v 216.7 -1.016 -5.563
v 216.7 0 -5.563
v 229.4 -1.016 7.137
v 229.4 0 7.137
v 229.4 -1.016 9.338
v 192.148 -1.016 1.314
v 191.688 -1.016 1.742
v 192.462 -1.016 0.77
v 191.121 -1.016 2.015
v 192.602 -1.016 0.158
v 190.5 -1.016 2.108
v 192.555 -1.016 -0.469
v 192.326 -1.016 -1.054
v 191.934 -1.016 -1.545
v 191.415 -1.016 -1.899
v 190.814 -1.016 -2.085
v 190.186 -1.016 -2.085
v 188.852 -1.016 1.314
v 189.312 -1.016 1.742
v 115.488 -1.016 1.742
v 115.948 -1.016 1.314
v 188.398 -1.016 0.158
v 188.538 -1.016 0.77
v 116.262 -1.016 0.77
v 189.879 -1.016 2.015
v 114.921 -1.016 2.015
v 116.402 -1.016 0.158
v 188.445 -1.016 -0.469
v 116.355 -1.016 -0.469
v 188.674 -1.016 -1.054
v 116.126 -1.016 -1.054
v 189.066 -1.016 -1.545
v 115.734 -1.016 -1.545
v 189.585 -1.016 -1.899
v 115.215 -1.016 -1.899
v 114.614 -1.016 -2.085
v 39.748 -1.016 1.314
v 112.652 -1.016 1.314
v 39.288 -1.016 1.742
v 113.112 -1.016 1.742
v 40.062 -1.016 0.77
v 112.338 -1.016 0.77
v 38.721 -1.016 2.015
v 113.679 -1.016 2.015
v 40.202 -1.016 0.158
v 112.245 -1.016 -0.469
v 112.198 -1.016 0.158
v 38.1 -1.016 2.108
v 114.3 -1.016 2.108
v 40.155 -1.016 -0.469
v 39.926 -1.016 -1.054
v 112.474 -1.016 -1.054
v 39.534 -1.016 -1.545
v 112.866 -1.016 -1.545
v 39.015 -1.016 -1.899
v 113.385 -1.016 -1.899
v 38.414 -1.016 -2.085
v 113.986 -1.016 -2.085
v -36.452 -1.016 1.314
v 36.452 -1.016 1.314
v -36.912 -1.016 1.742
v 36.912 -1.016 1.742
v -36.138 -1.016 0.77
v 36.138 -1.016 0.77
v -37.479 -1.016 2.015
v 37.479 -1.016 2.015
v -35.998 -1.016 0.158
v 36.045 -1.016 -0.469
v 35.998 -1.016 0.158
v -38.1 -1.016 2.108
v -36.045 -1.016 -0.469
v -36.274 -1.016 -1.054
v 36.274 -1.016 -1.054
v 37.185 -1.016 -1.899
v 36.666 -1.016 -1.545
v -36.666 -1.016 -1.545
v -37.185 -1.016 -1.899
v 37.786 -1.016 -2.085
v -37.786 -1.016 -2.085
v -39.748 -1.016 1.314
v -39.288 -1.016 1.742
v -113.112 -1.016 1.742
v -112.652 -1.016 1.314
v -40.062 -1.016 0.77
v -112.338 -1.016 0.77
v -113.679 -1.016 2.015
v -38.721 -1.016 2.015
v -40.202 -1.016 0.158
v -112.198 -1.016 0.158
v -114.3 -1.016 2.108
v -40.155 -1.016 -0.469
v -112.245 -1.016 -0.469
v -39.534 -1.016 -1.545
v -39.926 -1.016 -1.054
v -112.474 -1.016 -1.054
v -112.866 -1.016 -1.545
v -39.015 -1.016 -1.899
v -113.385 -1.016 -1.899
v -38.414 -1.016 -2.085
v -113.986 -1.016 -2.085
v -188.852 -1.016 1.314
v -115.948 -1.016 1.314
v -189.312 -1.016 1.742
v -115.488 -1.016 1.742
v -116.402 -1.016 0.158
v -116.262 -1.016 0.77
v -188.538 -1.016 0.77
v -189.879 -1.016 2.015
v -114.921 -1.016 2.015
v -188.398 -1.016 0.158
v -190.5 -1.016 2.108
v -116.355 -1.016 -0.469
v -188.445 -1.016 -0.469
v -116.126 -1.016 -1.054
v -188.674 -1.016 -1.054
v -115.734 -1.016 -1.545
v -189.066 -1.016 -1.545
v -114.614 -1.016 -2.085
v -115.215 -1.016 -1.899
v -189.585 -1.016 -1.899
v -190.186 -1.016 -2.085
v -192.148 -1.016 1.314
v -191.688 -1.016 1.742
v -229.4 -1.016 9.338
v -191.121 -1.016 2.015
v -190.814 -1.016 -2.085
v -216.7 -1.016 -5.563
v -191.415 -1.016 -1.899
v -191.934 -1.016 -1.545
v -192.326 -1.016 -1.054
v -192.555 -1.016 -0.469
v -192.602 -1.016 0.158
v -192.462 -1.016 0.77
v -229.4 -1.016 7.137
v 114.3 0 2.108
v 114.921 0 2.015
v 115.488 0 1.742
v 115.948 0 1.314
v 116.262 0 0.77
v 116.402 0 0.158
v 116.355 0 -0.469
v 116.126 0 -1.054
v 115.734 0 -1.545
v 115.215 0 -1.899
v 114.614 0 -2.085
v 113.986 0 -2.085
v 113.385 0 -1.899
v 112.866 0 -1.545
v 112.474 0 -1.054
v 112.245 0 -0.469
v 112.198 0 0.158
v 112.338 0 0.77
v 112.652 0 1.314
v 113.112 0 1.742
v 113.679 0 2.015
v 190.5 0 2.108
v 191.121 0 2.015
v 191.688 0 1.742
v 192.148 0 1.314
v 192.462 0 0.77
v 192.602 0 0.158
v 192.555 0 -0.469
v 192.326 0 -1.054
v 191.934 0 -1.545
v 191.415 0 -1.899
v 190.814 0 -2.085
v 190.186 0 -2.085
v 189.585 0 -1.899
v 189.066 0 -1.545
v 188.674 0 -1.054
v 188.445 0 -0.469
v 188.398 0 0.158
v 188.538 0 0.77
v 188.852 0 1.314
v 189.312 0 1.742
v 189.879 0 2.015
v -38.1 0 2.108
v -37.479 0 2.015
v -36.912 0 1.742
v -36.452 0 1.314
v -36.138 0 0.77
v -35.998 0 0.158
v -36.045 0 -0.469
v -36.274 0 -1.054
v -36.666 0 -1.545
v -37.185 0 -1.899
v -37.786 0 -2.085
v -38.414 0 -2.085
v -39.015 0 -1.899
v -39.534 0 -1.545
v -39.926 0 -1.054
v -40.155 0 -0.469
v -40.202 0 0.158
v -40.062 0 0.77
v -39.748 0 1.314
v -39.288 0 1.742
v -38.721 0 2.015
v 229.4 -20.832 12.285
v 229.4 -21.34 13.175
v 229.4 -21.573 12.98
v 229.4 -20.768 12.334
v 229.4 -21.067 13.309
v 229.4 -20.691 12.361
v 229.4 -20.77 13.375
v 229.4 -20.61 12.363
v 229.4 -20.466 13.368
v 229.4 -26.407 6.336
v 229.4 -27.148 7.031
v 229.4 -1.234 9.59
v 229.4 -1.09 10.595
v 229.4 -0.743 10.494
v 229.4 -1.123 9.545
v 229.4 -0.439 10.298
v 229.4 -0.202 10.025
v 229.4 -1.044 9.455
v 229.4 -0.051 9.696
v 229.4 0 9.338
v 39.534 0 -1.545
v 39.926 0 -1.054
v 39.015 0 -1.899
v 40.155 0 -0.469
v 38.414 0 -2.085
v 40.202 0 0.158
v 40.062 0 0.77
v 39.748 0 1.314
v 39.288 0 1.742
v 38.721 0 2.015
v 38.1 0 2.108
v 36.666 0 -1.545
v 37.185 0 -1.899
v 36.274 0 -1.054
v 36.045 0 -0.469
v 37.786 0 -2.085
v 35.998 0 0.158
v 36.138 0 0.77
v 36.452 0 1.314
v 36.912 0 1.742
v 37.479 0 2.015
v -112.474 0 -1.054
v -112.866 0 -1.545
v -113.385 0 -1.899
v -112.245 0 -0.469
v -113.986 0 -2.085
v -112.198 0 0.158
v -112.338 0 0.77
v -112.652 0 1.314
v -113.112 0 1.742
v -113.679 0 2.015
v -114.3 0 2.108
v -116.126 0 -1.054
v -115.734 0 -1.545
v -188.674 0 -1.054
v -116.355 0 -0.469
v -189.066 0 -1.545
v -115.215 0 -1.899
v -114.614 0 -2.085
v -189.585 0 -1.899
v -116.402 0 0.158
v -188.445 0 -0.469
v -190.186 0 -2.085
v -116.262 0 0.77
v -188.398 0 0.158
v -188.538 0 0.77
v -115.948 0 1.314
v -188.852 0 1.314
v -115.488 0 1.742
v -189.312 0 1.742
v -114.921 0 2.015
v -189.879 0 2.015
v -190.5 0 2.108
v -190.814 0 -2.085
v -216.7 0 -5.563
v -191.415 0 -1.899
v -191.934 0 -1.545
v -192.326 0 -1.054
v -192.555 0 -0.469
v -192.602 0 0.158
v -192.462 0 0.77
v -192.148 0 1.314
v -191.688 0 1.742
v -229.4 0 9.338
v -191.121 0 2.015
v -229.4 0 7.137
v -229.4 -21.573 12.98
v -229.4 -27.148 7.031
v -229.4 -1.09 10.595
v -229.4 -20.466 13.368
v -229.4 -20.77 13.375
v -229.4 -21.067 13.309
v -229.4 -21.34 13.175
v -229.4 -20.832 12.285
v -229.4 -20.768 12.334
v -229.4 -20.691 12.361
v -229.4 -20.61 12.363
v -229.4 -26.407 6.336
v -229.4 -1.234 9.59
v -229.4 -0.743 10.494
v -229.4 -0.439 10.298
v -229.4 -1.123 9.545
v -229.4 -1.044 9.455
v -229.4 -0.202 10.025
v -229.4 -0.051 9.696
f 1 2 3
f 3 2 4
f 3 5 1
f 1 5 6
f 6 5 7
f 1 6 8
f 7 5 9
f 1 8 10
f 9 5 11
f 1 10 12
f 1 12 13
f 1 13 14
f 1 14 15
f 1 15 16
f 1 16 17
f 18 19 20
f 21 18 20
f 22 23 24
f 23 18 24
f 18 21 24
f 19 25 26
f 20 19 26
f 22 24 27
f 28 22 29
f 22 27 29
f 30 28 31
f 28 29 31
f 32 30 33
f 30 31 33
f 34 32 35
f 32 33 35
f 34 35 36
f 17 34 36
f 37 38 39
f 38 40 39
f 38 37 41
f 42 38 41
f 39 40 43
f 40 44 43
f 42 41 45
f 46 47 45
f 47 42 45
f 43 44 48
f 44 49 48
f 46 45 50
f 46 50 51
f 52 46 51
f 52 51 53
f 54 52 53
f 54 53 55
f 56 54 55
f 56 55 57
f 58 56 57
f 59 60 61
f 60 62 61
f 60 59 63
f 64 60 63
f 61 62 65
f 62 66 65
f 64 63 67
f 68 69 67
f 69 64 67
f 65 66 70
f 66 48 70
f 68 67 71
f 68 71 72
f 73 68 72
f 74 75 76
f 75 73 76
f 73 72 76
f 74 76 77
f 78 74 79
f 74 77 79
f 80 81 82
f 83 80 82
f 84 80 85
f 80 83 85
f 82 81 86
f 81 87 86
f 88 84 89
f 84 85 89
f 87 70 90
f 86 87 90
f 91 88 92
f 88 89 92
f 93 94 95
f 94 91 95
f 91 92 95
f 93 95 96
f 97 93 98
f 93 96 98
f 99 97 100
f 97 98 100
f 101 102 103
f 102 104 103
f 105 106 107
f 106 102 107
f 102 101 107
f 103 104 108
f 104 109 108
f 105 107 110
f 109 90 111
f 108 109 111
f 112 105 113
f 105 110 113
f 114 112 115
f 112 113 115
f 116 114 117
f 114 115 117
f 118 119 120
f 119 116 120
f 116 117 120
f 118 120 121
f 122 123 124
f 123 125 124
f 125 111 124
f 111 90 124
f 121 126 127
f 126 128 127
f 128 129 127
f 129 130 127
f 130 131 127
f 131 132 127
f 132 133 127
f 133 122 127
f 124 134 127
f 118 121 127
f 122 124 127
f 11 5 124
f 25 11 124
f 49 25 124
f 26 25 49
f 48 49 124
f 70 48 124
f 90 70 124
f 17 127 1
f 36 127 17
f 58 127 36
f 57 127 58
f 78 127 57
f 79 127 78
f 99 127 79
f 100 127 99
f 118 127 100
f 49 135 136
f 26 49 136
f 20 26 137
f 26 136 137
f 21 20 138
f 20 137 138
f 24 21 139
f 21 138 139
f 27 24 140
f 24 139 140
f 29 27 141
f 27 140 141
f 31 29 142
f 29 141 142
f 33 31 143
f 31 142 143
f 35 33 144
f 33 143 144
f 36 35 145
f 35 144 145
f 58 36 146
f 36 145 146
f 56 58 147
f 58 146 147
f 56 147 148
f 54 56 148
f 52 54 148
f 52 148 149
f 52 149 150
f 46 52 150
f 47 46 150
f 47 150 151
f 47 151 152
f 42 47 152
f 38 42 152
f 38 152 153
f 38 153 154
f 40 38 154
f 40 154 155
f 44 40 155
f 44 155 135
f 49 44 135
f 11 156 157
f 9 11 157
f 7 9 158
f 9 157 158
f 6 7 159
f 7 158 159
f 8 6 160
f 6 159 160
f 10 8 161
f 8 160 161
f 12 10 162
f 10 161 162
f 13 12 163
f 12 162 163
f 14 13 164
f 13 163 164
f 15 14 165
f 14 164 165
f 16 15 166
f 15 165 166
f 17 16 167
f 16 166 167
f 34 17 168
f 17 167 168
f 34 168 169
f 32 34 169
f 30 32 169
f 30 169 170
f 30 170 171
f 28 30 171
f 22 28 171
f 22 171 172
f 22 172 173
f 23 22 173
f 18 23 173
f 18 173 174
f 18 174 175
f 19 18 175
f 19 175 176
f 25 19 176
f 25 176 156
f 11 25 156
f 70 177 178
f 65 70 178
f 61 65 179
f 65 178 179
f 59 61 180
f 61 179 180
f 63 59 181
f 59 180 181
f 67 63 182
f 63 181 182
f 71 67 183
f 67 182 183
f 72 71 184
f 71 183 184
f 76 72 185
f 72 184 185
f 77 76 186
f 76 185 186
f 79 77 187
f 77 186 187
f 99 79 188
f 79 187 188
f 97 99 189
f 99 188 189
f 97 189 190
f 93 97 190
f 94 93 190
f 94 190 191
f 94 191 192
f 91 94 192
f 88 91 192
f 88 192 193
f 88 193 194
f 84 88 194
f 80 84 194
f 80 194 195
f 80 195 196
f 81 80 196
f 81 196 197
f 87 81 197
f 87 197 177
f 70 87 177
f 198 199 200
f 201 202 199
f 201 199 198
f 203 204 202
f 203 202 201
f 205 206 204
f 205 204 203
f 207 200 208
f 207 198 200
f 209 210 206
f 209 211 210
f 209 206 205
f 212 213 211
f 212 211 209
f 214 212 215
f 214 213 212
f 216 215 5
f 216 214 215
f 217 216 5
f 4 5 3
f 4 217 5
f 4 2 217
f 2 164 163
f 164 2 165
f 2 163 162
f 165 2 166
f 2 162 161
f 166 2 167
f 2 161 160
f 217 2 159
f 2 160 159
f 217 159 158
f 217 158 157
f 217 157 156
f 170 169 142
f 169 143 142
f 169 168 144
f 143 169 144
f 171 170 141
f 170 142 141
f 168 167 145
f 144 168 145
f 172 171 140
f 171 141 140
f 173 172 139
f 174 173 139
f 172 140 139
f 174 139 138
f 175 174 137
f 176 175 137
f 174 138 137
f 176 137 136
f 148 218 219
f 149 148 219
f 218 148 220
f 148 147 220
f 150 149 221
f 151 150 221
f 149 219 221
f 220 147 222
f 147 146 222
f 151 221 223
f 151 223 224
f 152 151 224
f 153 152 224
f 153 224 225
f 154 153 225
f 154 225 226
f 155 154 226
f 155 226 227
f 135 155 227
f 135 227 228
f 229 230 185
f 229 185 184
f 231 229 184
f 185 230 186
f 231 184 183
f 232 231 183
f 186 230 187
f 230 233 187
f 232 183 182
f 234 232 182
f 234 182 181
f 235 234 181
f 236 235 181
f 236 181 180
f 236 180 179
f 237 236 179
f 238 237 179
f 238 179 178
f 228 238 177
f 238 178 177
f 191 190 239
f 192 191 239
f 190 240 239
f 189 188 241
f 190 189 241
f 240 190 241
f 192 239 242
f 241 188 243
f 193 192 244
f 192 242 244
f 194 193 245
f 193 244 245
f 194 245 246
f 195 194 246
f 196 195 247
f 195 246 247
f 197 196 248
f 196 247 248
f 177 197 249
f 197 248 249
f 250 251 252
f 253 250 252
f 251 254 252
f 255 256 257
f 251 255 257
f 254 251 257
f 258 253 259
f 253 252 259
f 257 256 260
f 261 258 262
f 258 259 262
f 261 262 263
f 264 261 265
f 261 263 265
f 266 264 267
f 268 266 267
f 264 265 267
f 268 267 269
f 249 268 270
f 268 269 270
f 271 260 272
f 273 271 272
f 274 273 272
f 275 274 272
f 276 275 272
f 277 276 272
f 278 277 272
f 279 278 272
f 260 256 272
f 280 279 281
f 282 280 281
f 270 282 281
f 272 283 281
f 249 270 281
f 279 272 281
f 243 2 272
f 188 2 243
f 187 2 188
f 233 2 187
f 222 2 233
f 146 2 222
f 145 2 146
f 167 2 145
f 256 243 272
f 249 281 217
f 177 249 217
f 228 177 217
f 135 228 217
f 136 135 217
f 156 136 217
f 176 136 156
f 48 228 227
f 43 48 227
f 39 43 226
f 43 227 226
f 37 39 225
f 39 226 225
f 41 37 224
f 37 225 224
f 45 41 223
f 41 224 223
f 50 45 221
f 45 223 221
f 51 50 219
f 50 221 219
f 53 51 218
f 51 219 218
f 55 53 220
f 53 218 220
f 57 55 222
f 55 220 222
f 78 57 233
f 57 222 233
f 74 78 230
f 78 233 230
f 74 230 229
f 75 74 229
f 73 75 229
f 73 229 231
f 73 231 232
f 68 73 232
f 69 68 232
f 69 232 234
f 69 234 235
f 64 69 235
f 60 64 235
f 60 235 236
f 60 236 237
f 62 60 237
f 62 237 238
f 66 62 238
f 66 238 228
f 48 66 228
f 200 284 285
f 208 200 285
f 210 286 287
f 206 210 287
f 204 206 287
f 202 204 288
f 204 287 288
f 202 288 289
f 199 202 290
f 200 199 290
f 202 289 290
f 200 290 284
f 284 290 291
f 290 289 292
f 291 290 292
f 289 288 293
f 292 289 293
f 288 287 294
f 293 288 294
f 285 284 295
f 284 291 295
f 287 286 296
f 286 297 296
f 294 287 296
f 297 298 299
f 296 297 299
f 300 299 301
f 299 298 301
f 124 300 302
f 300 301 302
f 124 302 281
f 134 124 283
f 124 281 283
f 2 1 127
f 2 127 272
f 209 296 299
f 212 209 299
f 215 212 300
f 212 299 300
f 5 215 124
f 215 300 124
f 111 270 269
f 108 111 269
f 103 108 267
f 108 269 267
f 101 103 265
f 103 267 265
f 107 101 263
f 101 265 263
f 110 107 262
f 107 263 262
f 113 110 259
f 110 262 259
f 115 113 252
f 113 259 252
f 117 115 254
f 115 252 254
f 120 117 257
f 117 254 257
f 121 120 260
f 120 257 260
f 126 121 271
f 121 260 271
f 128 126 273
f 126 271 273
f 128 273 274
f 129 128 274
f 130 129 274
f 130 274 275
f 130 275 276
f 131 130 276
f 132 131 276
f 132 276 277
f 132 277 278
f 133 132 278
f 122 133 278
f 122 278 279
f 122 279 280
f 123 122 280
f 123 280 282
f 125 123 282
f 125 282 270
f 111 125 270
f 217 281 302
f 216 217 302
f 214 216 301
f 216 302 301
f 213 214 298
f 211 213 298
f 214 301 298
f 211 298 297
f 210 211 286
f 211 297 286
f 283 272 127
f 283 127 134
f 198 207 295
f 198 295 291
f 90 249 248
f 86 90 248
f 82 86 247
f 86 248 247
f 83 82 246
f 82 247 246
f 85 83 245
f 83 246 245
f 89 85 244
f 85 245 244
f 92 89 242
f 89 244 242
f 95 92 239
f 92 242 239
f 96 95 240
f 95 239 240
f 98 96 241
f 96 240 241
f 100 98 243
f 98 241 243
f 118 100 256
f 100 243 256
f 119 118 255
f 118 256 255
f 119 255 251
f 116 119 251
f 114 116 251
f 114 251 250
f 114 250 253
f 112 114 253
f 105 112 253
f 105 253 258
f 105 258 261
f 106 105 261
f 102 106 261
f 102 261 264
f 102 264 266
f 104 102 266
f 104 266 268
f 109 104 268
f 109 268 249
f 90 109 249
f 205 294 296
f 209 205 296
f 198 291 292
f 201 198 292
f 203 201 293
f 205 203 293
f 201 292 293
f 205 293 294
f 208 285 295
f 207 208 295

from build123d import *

# Parameters (mm, degrees)
BASE_FLANGE1_START = -229.4001
BASE_FLANGE1_DEPTH = 458.8002
SKETCH3_R          = 2.1082
CUT_EXTRUDE1_DEPTH = 232.388150944
CUT_EXTRUDE2_DEPTH = 1.016


# Read off the part's stored shape, not the designer's step: Base-Flange1
with BuildPart() as part:
    # Base-Flange1 outline → Base-Flange1 (new body)
    with BuildSketch(Plane(origin=(0, 0, 0), x_dir=(0, 0, -1), z_dir=(1, 0, 0)).offset(BASE_FLANGE1_START)):
        with BuildLine():
            ThreePointArc((-13.368341311, -20.466361656), (-13.309368584, -21.067196635), (-12.979624418, -21.572913195))
            Line((-12.979624418, -21.572913195), (-7.031153987, -27.148026486))
            Line((-7.031153987, -27.148026486), (-6.336374453, -26.406718588))
            Line((-6.336374453, -26.406718588), (-12.284844884, -20.831605297))
            ThreePointArc((-12.284844884, -20.831605297), (-12.350793717, -20.730461985), (-12.362588262, -20.610294989))
            Line((-12.362588262, -20.610294989), (-9.589648793, -1.234016667))
            ThreePointArc((-9.589648793, -1.234016667), (-9.504607996, -1.078094077), (-9.33821053, -1.016))
            Line((-9.33821053, -1.016), (5.5626, -1.016))
            Line((5.5626, -1.016), (5.5626, 0))
            Line((5.5626, 0), (-9.33821053, 0))
            ThreePointArc((-9.33821053, 0), (-10.17019786, -0.310470384), (-10.595401842, -1.090083333))
            Line((-10.595401842, -1.090083333), (-13.368341311, -20.466361656))
        make_face()
    extrude(amount=BASE_FLANGE1_DEPTH)

    # Sketch3 → Cut-Extrude1 (cut, through all)
    with BuildSketch(Plane(origin=(0, 0, 0), x_dir=(1, 0, 0), z_dir=(0, 1, 0))):
        with Locations(Location((-38.1, 0, 0), (0, 0, 270))):
            Circle(SKETCH3_R)
        with Locations(Location((-114.3, 0, 0), (0, 0, 270))):
            Circle(SKETCH3_R)
        with Locations(Location((-190.5, 0, 0), (0, 0, 270))):
            Circle(SKETCH3_R)
        with Locations(Location((190.5, 0, 0), (0, 0, 270))):
            Circle(SKETCH3_R)
        with Locations(Location((114.3, 0, 0), (0, 0, 270))):
            Circle(SKETCH3_R)
        with Locations(Location((38.1, 0, 0), (0, 0, 270))):
            Circle(SKETCH3_R)
    extrude(amount=-CUT_EXTRUDE1_DEPTH, mode=Mode.SUBTRACT)

    # Sketch4 → Cut-Extrude2 (cut)
    with BuildSketch(Plane(origin=(0, 0, 0), x_dir=(1, 0, 0), z_dir=(0, 1, 0))):
        Polygon((-215.810037107, 6.452662893), (-235.374711333, -13.112011333), (-235.374711333, 6.452662893), align=None)
        Polygon((235.374711333, 6.452662893), (215.810037107, 6.452662893), (235.374711333, -13.112011333), align=None)
    extrude(amount=-CUT_EXTRUDE2_DEPTH, mode=Mode.SUBTRACT)


solid = part.part
